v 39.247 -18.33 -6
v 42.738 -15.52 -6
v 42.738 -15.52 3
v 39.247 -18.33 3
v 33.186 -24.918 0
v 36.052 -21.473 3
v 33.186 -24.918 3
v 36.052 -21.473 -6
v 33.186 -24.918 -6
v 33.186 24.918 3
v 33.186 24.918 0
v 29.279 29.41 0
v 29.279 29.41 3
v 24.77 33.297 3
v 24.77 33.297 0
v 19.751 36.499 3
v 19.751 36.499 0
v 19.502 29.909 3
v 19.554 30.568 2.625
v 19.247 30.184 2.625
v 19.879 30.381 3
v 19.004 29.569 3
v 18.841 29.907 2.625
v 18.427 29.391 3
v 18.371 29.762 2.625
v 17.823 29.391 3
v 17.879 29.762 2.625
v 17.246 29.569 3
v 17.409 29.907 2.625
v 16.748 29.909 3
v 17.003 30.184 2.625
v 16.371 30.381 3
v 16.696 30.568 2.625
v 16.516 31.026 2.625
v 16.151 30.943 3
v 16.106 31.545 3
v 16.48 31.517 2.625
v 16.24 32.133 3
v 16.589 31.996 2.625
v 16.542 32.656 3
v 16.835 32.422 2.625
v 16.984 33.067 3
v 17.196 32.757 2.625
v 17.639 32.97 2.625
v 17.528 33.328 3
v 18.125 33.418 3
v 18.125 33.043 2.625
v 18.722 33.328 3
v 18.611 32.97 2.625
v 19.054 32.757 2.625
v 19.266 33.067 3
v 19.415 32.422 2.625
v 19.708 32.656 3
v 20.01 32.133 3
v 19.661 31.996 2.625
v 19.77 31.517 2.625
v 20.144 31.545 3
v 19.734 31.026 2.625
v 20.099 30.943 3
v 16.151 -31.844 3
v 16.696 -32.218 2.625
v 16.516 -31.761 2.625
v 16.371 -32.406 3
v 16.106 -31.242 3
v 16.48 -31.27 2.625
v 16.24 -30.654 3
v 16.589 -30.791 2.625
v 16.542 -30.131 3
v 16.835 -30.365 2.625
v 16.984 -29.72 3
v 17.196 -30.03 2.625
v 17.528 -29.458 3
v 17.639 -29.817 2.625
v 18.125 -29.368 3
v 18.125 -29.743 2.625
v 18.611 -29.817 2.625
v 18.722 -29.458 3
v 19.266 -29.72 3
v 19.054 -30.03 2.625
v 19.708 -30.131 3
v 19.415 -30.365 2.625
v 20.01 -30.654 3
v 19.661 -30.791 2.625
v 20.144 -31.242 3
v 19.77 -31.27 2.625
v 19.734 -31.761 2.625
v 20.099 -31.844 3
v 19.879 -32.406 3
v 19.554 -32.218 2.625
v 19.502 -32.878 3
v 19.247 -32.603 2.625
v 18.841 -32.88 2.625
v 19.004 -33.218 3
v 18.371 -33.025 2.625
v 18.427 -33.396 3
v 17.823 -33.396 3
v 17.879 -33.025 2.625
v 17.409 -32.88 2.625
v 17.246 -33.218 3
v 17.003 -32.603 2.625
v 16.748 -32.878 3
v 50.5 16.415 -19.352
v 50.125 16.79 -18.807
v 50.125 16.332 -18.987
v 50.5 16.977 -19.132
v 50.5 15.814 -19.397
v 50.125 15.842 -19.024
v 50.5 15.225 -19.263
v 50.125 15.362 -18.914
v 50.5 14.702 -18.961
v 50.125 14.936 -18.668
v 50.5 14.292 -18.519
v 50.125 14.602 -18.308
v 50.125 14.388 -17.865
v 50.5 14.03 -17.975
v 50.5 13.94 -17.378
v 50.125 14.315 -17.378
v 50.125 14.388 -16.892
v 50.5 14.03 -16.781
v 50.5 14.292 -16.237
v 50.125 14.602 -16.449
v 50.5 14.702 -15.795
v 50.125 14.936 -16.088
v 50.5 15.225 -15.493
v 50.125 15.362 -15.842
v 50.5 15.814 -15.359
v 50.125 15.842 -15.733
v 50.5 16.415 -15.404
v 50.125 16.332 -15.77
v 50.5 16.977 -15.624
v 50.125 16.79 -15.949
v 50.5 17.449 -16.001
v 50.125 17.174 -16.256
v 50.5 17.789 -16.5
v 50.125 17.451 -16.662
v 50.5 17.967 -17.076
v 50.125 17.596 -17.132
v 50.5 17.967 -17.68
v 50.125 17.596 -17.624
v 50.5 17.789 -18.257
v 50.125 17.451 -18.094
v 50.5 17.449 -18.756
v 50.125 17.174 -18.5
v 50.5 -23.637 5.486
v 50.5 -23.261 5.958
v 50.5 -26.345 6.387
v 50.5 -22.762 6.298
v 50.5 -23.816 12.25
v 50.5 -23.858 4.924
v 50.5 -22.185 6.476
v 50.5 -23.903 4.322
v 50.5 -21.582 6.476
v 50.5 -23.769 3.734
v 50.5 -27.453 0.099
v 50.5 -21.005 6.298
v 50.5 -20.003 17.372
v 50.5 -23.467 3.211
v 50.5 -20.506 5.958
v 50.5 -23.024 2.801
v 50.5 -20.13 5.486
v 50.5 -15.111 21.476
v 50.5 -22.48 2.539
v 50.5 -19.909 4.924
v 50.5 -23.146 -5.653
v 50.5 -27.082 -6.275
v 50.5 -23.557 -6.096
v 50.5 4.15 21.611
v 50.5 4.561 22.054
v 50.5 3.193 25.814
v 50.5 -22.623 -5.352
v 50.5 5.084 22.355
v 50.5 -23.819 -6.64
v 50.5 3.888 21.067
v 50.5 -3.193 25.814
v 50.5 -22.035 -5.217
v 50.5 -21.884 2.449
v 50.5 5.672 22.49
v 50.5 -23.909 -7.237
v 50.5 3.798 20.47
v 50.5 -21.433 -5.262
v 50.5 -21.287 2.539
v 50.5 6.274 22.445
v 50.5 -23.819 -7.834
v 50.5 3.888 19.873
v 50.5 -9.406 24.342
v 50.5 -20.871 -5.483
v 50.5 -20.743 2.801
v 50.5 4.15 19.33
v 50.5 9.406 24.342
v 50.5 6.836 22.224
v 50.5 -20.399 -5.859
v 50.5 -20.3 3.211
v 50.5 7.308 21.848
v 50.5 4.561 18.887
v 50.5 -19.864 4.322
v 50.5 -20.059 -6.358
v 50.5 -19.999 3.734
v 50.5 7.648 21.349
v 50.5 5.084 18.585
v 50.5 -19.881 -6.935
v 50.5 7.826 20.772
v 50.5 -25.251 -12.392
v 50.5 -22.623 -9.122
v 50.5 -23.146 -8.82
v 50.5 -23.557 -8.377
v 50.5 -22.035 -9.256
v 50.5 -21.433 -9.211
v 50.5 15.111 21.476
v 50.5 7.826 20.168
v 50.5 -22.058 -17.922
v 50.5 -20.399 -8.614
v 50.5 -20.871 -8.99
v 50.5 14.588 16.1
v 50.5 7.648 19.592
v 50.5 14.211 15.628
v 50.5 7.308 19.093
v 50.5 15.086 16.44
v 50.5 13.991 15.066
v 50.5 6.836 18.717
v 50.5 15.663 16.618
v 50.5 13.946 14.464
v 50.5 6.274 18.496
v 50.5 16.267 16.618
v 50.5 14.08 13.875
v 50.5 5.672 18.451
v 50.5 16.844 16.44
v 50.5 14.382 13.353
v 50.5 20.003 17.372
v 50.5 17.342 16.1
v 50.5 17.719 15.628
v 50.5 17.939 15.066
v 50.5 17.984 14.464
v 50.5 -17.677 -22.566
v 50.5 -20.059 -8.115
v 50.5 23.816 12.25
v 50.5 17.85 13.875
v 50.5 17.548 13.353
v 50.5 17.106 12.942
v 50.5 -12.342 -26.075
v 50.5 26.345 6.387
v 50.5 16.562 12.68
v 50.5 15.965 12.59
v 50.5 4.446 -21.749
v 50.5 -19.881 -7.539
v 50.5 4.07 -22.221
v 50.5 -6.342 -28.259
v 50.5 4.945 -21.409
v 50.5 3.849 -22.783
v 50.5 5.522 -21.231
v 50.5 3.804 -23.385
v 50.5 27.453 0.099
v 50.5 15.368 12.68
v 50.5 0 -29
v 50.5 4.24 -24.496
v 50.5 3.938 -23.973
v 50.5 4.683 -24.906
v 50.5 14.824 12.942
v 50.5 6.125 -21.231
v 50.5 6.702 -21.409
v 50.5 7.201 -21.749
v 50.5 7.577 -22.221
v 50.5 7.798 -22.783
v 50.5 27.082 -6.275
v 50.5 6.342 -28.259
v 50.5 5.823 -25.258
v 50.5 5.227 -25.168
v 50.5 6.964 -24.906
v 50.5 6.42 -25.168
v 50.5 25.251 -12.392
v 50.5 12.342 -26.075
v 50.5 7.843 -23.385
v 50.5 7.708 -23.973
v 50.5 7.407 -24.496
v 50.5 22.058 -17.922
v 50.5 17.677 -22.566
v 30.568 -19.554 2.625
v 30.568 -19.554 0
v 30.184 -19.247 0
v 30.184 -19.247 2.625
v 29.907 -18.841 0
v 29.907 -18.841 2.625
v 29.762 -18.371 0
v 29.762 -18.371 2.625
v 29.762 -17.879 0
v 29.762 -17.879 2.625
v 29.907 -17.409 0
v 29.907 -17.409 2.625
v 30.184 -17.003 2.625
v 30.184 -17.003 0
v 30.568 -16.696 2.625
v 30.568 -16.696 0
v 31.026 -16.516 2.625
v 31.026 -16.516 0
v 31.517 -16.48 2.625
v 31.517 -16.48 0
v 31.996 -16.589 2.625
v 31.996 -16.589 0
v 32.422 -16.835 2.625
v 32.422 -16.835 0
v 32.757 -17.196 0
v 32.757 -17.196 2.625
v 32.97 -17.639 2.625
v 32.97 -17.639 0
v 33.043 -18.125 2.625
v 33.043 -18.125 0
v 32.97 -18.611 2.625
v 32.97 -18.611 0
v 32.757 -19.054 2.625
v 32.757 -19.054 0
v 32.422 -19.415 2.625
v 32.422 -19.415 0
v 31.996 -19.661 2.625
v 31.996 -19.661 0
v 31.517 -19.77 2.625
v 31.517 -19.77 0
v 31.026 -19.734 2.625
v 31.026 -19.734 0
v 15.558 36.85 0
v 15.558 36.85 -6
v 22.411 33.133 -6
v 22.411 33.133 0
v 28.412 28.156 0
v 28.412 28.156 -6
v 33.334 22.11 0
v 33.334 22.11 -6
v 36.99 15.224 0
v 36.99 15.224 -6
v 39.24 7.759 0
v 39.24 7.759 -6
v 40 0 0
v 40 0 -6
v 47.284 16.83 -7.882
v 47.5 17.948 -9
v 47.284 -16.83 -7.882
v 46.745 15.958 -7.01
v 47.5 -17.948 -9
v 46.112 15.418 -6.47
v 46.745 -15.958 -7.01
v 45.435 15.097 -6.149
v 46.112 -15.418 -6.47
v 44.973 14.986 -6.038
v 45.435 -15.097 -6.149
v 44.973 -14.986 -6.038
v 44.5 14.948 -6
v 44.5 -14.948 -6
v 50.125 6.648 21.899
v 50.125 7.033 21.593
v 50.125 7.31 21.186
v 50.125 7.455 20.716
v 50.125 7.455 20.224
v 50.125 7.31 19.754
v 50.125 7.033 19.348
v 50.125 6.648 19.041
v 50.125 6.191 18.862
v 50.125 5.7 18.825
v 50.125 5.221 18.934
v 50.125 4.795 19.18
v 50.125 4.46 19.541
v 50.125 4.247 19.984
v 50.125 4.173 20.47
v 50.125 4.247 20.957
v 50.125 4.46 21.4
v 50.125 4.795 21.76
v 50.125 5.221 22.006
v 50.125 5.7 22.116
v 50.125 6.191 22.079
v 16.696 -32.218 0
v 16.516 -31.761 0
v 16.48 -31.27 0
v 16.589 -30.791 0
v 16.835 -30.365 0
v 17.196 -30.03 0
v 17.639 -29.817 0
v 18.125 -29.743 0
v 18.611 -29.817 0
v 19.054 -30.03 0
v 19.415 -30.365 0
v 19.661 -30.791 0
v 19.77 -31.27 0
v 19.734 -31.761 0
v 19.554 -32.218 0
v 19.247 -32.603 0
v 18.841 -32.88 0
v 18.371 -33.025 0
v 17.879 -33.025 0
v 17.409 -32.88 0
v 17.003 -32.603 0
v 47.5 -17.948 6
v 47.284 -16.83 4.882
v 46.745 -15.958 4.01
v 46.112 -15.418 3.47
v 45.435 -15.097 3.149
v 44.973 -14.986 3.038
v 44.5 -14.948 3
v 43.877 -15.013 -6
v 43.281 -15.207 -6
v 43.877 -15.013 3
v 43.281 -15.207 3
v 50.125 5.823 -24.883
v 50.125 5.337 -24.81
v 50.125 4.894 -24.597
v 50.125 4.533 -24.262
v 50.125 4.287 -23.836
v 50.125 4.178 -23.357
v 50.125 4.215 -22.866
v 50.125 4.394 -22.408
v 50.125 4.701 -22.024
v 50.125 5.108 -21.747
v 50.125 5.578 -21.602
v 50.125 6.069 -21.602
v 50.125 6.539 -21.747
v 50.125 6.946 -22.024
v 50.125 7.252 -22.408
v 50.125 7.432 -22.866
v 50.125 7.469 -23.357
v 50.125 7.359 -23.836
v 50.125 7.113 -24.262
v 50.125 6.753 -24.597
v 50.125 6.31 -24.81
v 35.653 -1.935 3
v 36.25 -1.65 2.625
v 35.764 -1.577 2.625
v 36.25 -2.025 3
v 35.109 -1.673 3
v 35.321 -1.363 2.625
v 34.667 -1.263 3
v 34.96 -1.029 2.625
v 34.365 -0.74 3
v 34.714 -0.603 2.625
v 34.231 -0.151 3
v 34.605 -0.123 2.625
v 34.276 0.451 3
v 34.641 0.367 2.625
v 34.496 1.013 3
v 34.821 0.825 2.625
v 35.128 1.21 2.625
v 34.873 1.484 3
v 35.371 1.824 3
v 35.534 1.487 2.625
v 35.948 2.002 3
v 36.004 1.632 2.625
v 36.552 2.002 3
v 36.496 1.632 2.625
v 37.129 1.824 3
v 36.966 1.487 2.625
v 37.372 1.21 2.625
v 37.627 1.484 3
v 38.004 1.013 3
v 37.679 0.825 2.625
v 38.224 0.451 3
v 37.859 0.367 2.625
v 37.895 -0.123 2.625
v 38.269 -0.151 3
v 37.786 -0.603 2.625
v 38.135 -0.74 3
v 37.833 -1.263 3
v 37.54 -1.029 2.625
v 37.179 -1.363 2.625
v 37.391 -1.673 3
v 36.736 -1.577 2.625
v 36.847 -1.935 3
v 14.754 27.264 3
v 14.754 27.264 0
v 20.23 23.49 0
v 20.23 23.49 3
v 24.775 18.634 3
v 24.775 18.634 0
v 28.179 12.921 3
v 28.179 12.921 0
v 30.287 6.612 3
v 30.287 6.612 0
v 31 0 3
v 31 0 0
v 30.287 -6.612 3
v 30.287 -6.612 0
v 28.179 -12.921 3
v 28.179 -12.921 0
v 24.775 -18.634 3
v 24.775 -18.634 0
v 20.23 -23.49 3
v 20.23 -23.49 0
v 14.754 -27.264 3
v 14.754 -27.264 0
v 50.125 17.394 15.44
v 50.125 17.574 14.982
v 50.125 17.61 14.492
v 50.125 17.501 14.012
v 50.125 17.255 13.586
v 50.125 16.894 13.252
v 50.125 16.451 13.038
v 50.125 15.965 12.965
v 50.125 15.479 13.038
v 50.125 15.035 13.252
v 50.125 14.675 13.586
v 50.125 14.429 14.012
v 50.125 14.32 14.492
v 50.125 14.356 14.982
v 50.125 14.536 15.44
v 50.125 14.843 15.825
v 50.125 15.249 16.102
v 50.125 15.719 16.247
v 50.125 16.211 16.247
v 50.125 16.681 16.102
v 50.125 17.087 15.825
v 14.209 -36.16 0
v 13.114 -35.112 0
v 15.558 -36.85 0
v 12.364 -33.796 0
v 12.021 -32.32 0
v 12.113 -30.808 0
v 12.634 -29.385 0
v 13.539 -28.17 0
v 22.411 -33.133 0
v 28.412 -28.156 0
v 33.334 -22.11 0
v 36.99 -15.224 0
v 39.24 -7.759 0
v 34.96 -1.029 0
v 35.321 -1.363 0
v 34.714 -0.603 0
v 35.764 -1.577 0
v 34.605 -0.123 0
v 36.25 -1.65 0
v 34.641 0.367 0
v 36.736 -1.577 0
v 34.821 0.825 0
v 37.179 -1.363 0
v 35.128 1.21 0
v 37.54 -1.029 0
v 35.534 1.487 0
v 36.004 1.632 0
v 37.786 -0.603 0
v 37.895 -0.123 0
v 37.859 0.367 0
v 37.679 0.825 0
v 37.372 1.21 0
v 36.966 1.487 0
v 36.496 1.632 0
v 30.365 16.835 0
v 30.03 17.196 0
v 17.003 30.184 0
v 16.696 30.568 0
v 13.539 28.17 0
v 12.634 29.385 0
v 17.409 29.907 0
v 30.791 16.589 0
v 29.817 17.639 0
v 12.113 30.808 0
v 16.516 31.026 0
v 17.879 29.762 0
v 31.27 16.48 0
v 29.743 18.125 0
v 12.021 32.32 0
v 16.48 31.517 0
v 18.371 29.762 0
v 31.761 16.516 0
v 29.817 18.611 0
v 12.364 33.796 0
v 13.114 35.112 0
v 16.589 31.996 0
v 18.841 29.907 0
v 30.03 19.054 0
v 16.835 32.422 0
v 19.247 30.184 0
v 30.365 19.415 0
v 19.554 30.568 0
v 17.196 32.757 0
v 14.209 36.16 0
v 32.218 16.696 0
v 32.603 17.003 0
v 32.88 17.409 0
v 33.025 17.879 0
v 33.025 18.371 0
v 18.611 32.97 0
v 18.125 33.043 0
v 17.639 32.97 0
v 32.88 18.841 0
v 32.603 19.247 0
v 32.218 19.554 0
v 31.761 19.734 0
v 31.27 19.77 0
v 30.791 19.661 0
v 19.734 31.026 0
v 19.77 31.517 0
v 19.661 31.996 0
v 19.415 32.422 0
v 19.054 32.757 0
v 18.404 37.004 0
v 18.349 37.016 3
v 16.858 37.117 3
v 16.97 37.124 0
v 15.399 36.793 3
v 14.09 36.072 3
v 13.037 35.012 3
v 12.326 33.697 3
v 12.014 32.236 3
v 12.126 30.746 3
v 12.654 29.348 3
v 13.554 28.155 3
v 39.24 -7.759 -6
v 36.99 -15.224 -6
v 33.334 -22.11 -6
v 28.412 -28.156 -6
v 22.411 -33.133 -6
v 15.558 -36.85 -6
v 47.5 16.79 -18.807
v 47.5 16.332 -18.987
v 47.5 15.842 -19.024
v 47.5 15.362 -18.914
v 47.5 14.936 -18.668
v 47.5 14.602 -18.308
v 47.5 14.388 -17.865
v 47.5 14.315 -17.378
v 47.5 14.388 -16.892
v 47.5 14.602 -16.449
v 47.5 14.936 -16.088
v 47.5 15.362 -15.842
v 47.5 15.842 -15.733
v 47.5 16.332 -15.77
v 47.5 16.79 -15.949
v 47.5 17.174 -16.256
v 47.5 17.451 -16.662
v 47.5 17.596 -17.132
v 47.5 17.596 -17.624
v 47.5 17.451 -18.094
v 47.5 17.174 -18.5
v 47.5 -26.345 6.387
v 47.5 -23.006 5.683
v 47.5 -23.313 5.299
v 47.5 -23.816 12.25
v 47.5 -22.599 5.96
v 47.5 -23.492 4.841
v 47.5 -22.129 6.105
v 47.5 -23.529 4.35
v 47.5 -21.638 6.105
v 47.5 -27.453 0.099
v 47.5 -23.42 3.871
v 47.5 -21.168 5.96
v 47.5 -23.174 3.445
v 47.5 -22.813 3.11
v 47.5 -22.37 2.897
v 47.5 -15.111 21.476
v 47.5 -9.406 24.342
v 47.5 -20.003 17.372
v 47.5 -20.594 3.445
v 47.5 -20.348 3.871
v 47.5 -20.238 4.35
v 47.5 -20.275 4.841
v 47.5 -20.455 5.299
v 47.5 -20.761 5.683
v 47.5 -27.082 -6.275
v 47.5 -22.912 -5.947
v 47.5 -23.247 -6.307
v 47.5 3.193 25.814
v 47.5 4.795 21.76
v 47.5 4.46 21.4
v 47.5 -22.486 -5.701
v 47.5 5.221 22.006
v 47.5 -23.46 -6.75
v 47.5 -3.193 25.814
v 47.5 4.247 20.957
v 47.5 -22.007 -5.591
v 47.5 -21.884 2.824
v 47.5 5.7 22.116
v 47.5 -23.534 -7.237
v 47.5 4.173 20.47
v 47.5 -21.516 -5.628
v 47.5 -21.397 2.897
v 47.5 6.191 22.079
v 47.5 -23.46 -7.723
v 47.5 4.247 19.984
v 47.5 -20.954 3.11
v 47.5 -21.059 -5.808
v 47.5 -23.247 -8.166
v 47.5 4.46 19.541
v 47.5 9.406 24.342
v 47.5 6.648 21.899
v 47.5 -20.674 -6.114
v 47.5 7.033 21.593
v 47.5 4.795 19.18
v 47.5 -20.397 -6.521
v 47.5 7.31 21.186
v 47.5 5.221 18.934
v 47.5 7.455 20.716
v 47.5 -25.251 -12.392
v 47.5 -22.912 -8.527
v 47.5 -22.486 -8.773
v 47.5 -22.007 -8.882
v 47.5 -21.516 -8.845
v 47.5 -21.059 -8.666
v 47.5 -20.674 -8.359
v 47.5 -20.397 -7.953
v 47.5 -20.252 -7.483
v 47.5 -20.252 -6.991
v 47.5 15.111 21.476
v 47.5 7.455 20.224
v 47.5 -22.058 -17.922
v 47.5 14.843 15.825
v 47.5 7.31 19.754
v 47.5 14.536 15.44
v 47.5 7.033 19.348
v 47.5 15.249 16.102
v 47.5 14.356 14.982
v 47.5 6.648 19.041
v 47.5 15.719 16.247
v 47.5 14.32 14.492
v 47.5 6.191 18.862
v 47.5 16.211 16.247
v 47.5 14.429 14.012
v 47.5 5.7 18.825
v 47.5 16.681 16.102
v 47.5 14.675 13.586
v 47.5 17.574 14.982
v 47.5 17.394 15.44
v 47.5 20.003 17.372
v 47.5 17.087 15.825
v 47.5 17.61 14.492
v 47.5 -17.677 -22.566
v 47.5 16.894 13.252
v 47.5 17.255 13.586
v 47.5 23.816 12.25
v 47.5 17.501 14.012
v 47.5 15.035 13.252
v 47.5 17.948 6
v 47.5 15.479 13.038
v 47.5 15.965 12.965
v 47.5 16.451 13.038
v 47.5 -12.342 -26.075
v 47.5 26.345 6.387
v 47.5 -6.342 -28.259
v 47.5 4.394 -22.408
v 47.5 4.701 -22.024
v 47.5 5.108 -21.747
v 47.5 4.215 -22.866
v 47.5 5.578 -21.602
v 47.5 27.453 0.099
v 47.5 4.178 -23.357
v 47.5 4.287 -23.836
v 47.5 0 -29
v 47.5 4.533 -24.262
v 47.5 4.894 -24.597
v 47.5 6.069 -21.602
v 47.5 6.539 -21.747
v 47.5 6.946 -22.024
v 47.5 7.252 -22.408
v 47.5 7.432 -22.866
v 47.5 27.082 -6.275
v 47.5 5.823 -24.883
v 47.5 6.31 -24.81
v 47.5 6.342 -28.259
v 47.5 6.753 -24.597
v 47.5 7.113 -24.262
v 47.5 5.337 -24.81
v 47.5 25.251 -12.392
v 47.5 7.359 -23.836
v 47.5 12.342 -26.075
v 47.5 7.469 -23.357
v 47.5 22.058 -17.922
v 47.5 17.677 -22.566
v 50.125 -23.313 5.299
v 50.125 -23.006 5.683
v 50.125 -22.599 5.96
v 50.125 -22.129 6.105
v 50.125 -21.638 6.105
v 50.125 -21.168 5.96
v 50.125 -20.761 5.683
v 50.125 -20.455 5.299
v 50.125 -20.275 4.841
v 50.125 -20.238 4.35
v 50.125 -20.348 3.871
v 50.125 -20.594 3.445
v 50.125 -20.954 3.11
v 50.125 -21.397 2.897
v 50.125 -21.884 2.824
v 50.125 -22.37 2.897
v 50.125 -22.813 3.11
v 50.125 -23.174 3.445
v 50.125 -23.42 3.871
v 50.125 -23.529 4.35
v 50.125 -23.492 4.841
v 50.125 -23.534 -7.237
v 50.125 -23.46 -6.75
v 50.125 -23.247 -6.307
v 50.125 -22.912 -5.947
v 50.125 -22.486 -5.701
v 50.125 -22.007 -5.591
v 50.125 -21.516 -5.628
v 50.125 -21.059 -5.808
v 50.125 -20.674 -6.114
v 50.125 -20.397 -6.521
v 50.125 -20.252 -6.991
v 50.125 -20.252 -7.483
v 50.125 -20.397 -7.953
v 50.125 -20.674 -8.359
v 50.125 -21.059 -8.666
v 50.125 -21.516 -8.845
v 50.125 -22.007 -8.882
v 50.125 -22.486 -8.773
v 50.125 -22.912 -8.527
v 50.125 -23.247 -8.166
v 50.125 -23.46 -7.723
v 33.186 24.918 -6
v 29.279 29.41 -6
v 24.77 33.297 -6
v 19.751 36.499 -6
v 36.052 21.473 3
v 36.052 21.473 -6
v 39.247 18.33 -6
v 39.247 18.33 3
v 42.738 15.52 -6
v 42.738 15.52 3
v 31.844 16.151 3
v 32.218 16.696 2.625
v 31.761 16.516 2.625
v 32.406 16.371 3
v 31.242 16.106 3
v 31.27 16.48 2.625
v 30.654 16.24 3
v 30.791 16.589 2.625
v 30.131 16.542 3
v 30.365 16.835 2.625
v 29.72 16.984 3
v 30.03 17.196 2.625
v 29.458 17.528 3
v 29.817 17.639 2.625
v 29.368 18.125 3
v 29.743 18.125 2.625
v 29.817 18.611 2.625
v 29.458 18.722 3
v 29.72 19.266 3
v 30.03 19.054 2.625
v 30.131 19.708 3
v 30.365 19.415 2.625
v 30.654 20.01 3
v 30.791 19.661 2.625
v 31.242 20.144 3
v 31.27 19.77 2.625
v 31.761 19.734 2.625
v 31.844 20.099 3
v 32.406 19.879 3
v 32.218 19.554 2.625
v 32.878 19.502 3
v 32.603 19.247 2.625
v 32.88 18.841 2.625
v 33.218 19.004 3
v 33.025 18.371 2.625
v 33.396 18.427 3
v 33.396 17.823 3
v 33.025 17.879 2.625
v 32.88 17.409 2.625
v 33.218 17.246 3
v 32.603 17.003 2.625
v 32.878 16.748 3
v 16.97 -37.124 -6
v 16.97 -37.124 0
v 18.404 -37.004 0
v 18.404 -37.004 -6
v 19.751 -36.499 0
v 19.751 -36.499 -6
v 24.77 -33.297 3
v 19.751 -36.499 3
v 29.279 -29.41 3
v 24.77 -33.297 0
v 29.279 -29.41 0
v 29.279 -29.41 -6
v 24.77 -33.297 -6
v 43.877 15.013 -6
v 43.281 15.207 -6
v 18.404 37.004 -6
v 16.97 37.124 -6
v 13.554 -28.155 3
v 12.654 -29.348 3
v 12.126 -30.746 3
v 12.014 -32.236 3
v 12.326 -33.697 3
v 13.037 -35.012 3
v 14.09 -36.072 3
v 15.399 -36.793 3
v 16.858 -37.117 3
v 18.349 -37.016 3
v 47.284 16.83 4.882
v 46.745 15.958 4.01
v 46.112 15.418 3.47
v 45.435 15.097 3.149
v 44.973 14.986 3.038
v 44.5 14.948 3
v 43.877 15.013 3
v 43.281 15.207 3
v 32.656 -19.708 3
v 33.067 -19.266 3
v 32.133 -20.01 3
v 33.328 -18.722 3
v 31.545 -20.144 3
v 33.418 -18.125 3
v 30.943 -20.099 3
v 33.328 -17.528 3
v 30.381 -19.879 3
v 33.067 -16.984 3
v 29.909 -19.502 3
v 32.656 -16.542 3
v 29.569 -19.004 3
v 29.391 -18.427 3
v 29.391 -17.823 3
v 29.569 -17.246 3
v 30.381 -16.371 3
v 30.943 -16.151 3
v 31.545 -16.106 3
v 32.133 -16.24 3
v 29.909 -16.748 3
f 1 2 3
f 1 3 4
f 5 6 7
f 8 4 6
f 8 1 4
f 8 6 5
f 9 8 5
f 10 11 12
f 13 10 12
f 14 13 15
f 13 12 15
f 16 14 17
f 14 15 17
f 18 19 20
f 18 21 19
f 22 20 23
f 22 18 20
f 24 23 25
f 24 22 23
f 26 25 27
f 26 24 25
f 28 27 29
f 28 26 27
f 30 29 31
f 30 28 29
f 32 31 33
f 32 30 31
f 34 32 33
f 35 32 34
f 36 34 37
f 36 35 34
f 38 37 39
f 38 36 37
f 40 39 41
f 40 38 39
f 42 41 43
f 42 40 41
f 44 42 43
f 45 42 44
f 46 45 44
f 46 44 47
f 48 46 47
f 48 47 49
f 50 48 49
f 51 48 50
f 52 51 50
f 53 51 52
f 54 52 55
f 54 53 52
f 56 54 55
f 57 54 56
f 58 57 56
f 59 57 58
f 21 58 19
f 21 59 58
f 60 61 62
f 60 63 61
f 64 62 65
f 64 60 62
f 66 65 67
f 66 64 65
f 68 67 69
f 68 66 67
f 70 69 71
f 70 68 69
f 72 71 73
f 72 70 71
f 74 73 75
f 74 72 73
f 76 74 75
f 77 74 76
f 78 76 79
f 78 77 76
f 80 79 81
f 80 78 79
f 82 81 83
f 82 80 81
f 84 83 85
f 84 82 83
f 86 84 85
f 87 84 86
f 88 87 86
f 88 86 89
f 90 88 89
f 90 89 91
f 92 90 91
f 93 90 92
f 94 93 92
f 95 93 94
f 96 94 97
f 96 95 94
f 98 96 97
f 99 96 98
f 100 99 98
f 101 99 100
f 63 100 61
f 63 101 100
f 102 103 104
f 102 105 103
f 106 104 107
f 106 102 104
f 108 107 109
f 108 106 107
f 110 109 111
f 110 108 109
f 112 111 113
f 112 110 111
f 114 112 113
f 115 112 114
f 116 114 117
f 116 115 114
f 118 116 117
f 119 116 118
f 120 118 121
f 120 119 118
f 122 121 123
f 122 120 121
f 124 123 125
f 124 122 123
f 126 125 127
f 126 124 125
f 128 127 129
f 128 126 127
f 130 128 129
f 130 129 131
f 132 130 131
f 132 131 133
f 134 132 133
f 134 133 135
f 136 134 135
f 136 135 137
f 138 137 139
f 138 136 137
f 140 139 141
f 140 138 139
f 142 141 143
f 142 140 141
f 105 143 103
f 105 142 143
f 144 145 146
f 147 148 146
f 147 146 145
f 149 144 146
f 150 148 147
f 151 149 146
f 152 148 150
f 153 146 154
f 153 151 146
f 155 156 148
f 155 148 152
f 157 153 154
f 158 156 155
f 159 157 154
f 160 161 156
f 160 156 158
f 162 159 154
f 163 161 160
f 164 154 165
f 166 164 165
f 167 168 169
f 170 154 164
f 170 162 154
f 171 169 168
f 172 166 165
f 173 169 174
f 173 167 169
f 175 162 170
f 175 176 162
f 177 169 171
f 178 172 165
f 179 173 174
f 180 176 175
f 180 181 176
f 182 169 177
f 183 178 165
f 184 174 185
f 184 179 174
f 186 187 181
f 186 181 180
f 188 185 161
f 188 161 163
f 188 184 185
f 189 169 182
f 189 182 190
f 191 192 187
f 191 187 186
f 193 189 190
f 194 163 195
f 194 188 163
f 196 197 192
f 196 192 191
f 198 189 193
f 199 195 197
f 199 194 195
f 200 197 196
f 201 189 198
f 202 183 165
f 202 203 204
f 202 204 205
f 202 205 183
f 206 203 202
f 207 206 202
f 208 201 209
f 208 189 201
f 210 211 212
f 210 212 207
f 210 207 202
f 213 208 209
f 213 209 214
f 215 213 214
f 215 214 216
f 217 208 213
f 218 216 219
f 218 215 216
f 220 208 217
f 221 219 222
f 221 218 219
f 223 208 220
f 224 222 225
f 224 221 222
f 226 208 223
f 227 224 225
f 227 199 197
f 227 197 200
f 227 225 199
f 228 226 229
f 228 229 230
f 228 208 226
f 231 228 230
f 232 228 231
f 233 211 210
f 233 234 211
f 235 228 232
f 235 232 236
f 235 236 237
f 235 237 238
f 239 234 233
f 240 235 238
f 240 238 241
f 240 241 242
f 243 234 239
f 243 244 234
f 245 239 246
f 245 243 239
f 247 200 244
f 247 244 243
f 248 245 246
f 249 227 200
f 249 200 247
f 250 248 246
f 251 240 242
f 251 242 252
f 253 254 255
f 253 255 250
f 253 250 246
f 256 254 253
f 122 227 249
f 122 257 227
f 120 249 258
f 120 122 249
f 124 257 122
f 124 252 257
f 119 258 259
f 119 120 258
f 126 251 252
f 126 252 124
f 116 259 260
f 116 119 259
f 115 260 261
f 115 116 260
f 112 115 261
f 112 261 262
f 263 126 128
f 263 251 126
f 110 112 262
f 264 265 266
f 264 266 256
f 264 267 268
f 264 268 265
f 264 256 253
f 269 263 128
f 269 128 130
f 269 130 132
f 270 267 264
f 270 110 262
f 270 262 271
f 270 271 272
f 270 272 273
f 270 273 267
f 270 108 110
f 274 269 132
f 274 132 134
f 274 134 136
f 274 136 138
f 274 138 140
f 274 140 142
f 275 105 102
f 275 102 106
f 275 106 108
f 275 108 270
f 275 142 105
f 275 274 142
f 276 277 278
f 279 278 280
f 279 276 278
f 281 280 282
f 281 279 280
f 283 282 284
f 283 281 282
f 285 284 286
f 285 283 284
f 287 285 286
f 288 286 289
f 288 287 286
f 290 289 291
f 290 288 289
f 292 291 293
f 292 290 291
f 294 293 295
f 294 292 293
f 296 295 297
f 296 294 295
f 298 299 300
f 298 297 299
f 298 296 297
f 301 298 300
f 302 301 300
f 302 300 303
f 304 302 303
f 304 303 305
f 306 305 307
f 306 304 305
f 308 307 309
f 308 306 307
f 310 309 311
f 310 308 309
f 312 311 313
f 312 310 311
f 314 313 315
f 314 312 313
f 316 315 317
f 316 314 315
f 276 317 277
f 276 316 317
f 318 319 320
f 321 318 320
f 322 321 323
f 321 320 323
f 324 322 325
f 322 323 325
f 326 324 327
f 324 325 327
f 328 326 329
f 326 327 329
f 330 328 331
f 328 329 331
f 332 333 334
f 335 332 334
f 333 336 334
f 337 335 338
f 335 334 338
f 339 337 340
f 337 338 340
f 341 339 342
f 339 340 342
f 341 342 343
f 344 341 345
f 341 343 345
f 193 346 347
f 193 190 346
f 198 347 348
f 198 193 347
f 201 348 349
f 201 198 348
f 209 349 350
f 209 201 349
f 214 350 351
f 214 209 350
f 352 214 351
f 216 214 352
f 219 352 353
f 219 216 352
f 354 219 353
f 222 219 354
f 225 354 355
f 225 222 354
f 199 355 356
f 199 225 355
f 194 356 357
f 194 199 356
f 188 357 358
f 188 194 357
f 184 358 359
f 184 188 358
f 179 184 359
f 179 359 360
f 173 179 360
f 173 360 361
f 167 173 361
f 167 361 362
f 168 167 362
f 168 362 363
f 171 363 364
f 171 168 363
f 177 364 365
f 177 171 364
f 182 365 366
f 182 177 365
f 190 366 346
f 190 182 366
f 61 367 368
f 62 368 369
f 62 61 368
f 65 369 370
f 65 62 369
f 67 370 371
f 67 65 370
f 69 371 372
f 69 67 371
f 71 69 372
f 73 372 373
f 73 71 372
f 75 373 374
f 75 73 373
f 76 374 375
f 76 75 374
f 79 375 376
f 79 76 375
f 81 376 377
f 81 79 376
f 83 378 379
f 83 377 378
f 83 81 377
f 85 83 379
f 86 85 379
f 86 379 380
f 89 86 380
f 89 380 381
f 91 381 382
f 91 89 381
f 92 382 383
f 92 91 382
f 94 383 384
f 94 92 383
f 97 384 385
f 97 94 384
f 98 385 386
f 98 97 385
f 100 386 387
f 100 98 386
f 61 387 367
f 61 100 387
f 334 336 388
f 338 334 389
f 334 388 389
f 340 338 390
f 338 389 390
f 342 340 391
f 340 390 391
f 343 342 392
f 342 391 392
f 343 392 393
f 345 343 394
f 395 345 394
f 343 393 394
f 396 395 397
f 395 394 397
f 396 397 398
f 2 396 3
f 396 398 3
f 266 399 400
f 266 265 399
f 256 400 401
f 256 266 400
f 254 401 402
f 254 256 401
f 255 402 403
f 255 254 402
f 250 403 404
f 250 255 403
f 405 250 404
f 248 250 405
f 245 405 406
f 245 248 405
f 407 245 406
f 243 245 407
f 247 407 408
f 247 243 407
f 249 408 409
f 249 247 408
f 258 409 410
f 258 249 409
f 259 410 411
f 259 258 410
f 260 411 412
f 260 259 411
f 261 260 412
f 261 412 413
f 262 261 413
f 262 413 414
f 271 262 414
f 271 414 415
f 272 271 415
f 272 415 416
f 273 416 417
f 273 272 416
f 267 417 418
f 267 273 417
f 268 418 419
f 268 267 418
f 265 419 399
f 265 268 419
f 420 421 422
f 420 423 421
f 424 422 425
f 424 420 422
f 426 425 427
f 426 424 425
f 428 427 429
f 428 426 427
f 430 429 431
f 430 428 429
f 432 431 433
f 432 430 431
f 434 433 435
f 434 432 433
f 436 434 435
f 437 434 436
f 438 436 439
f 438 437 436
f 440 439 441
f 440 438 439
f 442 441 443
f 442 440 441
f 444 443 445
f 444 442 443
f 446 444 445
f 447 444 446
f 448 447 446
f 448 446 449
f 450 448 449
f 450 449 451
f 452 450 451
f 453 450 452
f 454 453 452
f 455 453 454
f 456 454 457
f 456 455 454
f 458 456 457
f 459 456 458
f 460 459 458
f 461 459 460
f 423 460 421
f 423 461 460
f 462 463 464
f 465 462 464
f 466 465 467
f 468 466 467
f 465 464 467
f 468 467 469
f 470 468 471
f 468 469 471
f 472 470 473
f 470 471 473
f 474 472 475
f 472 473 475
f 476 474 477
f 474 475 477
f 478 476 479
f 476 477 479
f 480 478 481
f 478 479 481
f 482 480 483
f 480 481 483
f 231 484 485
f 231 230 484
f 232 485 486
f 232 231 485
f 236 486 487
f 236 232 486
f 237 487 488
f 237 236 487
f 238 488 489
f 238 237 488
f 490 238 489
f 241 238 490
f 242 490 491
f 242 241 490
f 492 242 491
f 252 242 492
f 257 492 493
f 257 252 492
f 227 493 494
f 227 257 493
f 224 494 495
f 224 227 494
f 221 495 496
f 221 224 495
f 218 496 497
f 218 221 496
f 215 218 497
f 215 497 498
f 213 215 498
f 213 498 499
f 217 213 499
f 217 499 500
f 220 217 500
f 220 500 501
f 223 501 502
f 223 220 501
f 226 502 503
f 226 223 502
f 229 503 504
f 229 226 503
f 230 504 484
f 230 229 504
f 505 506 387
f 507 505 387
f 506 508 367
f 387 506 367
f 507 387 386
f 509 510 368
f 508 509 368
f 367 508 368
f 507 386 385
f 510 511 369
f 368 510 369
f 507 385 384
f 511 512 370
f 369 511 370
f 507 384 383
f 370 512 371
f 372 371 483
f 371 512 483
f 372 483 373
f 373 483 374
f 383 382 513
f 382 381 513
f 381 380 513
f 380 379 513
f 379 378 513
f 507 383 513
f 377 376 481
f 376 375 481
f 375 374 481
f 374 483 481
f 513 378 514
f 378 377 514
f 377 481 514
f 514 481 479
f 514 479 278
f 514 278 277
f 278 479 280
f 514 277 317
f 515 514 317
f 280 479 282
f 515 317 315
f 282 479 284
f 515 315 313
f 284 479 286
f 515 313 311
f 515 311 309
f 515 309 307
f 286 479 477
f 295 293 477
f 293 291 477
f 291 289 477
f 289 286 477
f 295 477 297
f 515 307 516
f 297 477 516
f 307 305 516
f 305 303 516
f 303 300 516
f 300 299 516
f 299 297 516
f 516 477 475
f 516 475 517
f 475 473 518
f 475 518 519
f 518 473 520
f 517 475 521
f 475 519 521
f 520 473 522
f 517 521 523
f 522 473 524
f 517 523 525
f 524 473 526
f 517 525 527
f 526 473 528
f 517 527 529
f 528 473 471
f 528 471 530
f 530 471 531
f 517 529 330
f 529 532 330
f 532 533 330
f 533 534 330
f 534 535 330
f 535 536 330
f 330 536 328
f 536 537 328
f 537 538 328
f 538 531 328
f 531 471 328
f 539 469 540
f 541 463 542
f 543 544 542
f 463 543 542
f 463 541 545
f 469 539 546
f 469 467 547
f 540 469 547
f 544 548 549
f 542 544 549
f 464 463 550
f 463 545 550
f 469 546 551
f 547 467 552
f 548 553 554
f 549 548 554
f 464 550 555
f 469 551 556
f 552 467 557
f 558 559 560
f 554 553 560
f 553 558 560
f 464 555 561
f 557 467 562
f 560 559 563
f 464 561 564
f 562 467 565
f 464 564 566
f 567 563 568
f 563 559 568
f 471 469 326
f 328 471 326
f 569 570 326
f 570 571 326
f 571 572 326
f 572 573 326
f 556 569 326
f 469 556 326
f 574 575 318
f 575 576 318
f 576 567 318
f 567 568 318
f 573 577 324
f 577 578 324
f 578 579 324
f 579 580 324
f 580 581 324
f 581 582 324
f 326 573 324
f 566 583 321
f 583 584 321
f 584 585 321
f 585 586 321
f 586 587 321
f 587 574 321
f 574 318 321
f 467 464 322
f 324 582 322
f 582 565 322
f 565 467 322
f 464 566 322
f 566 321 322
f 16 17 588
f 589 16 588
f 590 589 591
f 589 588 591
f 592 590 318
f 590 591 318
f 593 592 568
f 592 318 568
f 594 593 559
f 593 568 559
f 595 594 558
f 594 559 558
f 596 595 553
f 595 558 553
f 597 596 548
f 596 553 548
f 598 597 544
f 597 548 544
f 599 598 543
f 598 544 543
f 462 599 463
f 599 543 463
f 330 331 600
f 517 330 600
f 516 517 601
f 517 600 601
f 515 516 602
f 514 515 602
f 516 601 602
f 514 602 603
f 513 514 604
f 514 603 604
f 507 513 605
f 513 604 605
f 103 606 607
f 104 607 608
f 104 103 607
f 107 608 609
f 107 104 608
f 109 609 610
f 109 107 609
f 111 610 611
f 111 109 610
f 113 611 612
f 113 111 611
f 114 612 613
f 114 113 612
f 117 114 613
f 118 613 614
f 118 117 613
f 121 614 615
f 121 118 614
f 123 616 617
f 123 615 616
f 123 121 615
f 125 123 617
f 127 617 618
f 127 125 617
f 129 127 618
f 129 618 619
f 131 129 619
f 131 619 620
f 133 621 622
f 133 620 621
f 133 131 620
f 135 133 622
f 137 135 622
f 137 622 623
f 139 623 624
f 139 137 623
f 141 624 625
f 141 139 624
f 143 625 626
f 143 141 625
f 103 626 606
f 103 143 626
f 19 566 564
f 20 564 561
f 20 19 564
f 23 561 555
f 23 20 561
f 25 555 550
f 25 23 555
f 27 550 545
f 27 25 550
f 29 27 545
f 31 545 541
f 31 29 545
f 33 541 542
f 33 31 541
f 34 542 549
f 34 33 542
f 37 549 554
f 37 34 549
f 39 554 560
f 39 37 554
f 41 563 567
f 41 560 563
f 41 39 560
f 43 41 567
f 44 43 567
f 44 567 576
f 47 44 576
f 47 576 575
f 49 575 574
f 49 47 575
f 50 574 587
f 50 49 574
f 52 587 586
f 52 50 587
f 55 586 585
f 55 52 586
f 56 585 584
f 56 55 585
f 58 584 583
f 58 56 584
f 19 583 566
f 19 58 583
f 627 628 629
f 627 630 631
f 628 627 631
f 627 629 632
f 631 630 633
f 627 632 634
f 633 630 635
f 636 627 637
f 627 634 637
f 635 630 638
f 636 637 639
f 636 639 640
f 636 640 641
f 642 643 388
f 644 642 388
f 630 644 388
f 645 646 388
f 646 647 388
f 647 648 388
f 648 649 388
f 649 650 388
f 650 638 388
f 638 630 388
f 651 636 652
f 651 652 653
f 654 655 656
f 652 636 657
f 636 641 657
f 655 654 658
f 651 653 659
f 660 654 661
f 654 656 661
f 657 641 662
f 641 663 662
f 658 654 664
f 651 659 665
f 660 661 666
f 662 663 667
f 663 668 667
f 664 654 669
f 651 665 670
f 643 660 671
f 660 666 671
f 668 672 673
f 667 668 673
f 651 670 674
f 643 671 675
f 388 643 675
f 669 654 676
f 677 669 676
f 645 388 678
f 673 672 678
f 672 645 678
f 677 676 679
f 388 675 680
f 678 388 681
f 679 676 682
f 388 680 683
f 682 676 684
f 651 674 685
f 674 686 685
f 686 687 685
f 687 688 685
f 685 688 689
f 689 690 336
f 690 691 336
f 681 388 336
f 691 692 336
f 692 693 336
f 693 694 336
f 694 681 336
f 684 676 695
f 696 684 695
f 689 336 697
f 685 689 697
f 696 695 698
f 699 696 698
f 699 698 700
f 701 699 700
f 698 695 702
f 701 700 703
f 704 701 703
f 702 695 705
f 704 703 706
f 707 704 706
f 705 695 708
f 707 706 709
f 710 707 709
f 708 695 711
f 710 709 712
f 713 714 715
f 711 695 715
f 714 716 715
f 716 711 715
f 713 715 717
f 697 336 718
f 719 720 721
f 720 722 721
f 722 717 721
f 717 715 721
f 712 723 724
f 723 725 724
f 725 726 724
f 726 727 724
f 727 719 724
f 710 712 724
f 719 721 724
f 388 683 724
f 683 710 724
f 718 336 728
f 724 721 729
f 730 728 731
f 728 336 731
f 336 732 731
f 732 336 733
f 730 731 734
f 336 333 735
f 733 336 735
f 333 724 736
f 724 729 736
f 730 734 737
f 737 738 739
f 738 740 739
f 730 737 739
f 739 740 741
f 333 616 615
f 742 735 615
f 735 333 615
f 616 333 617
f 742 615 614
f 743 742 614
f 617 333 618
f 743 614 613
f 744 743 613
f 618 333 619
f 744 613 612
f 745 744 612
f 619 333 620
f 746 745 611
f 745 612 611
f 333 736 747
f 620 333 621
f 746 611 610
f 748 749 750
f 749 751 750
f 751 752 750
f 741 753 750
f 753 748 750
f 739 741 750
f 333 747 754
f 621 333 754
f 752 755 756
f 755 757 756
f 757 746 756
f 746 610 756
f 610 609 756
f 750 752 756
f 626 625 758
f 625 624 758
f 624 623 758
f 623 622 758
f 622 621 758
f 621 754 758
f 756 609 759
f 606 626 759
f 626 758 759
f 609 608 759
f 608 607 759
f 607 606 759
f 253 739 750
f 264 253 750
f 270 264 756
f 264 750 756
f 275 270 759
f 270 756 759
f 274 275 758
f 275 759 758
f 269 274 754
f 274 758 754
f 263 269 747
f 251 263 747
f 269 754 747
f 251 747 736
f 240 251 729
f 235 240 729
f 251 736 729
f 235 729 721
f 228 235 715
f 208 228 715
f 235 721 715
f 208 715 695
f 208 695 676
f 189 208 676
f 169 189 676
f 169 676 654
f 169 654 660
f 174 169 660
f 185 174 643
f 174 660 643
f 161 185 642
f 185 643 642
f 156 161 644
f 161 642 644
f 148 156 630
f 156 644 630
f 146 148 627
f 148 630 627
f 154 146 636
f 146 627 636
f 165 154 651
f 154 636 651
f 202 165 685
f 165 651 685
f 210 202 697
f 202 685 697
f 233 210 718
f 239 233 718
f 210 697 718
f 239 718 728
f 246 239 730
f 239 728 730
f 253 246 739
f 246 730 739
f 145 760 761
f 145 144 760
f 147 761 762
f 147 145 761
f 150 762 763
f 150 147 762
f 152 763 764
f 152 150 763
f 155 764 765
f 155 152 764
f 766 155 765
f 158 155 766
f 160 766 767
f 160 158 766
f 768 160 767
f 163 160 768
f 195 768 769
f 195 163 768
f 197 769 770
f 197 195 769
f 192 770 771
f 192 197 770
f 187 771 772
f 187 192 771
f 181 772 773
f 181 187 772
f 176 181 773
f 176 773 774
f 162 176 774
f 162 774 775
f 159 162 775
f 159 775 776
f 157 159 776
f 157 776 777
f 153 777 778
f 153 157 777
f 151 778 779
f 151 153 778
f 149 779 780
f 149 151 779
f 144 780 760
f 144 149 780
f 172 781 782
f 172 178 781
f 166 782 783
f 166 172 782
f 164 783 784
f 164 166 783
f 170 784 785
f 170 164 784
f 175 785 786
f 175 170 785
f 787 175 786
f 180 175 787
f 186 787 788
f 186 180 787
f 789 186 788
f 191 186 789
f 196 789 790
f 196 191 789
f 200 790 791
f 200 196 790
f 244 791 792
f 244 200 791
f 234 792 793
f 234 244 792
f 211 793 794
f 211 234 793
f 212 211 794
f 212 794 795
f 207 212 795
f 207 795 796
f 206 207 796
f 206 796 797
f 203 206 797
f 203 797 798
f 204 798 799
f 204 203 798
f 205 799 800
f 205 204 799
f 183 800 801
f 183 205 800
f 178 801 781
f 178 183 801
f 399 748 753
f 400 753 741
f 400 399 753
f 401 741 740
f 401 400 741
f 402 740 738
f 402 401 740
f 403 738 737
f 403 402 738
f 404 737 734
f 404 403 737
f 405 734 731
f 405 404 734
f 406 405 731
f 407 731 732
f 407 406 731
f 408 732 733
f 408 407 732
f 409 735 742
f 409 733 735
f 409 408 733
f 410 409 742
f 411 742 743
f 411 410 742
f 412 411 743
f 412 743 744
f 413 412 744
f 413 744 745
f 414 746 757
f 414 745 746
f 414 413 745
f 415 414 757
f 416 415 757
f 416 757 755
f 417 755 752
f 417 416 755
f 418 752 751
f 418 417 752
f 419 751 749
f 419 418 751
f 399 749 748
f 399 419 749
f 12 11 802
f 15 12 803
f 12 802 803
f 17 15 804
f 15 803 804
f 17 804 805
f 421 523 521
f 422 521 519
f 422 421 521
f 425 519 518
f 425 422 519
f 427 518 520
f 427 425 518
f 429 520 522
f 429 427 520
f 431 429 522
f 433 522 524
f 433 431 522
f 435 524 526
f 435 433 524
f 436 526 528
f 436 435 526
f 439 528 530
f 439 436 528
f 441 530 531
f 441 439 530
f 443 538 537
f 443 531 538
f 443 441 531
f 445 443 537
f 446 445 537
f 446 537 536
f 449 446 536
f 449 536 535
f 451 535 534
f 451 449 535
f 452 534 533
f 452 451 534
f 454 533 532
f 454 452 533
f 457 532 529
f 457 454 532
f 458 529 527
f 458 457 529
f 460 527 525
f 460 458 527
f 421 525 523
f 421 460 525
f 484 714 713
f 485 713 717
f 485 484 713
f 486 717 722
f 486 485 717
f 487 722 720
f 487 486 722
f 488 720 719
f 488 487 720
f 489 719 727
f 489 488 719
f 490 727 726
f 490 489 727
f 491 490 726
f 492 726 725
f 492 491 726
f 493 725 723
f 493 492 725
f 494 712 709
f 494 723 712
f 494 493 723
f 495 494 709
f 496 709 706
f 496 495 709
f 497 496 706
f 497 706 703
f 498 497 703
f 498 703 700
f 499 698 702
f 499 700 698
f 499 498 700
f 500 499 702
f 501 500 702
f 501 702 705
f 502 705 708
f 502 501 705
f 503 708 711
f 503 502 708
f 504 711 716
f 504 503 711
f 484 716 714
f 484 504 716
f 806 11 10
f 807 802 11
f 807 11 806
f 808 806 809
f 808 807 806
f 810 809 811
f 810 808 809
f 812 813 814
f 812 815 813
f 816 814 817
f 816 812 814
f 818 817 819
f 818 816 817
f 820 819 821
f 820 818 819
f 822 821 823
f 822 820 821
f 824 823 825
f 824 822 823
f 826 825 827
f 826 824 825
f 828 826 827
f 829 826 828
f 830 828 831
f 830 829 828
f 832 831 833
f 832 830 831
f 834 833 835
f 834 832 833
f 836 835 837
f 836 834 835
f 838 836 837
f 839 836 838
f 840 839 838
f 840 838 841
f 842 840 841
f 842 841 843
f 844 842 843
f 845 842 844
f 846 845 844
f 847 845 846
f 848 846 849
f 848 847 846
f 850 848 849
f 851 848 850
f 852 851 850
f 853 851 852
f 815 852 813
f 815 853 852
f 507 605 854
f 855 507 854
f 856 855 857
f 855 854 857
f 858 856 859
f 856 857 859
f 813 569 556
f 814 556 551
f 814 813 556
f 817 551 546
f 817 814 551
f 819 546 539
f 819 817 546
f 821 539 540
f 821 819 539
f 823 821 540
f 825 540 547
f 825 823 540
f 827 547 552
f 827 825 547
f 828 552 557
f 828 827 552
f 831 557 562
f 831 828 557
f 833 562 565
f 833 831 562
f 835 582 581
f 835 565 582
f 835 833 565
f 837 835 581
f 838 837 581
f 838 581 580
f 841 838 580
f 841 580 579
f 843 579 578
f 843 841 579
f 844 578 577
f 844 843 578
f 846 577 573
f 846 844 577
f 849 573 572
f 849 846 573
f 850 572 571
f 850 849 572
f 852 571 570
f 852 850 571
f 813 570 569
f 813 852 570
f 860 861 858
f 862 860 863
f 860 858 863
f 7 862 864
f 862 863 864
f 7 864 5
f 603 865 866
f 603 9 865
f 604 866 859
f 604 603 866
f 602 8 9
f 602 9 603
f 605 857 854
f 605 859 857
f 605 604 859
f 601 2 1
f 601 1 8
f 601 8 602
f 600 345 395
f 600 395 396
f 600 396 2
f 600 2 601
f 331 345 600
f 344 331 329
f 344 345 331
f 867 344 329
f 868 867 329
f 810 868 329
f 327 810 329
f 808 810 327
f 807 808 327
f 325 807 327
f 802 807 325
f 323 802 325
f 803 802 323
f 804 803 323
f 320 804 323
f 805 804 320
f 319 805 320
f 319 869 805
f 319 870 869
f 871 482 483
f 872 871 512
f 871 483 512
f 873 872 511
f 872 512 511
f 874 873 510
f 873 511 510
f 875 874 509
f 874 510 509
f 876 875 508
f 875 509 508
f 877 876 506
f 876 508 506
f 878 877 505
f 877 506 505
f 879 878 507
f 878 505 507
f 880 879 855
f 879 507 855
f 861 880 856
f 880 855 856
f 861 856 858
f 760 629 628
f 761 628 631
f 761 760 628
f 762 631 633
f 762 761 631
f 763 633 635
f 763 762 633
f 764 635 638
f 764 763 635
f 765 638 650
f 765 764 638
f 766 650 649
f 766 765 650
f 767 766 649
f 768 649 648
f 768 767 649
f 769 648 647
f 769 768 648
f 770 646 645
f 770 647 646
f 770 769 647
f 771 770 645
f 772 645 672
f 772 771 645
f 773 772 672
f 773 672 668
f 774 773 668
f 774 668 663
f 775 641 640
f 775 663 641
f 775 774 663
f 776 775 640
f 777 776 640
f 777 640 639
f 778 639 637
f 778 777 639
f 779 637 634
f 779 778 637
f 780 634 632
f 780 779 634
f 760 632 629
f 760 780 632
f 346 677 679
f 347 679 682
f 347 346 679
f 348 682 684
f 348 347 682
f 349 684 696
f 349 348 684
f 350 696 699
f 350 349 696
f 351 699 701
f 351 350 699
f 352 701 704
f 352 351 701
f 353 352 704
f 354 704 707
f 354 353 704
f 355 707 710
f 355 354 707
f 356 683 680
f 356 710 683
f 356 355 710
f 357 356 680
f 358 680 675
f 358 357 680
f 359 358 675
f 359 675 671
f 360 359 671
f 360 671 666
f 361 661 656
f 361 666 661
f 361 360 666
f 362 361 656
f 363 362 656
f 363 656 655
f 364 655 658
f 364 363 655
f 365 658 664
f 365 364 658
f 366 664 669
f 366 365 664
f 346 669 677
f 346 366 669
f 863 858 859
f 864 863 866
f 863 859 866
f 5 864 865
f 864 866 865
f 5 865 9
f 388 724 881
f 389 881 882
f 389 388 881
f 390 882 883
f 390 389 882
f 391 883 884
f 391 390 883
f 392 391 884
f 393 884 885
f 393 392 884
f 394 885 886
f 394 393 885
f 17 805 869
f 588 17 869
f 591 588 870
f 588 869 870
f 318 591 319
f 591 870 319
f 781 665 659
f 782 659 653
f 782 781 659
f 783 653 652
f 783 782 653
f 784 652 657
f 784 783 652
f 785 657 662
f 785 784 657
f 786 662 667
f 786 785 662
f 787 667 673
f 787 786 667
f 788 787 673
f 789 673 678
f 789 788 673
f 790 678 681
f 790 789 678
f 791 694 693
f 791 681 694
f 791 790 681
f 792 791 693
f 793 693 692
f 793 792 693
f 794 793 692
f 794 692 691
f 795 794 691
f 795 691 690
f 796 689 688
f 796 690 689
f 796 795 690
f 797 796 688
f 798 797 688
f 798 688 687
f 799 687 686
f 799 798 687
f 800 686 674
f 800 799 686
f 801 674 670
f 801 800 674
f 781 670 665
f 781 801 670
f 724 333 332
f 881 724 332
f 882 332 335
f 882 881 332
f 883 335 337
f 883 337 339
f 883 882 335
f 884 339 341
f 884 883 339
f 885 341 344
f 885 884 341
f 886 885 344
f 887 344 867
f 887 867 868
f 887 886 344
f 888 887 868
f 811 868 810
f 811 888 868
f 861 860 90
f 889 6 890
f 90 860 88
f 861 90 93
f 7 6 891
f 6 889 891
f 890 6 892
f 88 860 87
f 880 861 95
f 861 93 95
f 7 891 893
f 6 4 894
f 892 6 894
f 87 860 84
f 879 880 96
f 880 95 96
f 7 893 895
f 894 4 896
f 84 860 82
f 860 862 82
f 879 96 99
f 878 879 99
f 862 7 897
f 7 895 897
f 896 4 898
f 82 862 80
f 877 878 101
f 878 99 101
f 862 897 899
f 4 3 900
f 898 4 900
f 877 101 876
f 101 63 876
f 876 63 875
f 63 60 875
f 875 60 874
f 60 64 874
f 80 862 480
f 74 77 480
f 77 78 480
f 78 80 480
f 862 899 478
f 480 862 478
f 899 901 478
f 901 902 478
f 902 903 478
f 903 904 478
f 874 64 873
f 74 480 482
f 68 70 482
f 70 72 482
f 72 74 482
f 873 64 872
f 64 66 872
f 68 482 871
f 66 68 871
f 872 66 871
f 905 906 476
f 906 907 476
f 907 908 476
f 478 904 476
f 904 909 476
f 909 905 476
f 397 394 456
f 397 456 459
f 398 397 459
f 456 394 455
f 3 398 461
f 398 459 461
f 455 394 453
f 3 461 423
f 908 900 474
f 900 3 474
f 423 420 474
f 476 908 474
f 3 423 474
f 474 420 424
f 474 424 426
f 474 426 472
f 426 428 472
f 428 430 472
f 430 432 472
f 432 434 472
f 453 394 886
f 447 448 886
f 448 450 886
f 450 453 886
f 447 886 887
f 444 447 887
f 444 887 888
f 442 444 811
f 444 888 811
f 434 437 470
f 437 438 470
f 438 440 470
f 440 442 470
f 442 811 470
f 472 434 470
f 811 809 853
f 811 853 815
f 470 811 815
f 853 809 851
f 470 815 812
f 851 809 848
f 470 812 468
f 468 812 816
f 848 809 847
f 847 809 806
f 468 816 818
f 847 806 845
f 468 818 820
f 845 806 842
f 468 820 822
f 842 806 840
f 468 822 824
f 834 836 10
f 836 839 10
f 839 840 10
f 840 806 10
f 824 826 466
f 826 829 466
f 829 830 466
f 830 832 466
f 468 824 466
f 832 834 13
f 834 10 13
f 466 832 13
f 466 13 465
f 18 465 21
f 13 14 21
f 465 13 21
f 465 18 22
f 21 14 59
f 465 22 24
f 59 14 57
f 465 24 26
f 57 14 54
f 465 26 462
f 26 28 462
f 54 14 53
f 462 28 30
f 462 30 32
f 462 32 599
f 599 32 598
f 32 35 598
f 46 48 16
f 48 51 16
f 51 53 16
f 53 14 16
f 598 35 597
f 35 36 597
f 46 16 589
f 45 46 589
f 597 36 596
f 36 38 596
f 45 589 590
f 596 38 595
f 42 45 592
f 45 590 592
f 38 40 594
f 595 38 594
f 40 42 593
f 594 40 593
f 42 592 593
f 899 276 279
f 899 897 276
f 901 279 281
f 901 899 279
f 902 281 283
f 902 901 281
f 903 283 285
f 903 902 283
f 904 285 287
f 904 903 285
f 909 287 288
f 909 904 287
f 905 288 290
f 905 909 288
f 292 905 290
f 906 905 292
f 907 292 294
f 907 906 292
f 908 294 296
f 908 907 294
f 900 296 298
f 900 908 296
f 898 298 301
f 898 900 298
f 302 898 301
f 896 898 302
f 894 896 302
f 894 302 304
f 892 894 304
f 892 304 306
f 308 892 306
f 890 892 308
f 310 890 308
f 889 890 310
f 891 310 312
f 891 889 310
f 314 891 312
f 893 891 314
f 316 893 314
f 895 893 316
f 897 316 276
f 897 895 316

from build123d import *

# Parameters (mm, degrees)
BOSS_EXTRUDE5_DEPTH = 3
BOSS_EXTRUDE6_START = -6
BOSS_EXTRUDE6_DEPTH = 6
CIRPATTERN4_COUNT   = 12
BOSS_EXTRUDE8_START = -9
BOSS_EXTRUDE8_DEPTH = 9
SKETCH25_R          = 27.5
SKETCH25_W          = 9
SKETCH25_H          = 25
BOSS_EXTRUDE9_DEPTH = 3
CIRPATTERN5_COUNT   = 12
FILLET2_R           = 3


with BuildPart() as part:
    # Sketch1 → Boss-Extrude5 (new body)
    with BuildSketch(Plane.XY):
        with BuildLine():
            ThreePointArc((14.753571677, -27.264117862), (12.634850146, -34.380016896), (19.750749181, -36.498738428))
            ThreePointArc((19.750749181, -36.498738428), (41.5, 0), (19.750749181, 36.498738428))
            ThreePointArc((19.750749181, 36.498738428), (12.634850146, 34.380016896), (14.753571677, 27.264117862))
            ThreePointArc((14.753571677, 27.264117862), (31, 0), (14.753571677, -27.264117862))
        make_face()
    extrude(amount=BOSS_EXTRUDE5_DEPTH)

    # Sketch1<7> → Boss-Extrude6 (add)
    with BuildSketch(Plane.XY.offset(BOSS_EXTRUDE6_START)):
        with BuildLine():
            ThreePointArc((40, 0), (33.333983987, -22.109851007), (15.557724422, -36.850470972))
            ThreePointArc((15.557724422, -36.850470972), (17.691016162, -37.113053671), (19.750749181, -36.498738428))
            ThreePointArc((19.750749181, -36.498738428), (35.650428406, -21.243750952), (41.5, 0))
            ThreePointArc((41.5, 0), (35.650428406, 21.243750952), (19.750749181, 36.498738428))
            ThreePointArc((19.750749181, 36.498738428), (17.691016162, 37.113053671), (15.557724422, 36.850470972))
            ThreePointArc((15.557724422, 36.850470972), (33.333983987, 22.109851007), (40, 0))
        make_face()
    extrude(amount=BOSS_EXTRUDE6_DEPTH)

    # Sketch23 → M4x0.7 Tapped Hole4 (revolve, cut)
    with BuildSketch(Plane(origin=(36.25, 0, 3), x_dir=(0, -1, 0), z_dir=(1, 0, 0))):
        Polygon((0, 0), (0, 11.091420021), (1.65, 10.1), (1.65, 0.375), (2.025, 0), align=None)
    m4x0_7_tapped_hole4 = revolve(axis=Axis((36.25, 0, 9.35), (0, 0, -1)), mode=Mode.SUBTRACT)

    # CirPattern4: M4x0.7 Tapped Hole4 ×12 about axis, 7 skipped
    cirpattern4_axis = Axis((0, 0, 0), (0, 0, -1))
    add([m4x0_7_tapped_hole4.rotate(cirpattern4_axis, i * 360 / CIRPATTERN4_COUNT) for i in range(1, CIRPATTERN4_COUNT) if i not in (3, 4, 5, 6, 7, 8, 9)], mode=Mode.SUBTRACT)

    # Sketch15 → Boss-Extrude8 (add)
    with BuildSketch(Plane.XY.offset(3).offset(BOSS_EXTRUDE8_START)):
        with BuildLine():
            Line((47.5, 12.5), (47.5, -12.5))
            ThreePointArc((47.5, -12.5), (39.682119593, -17.947088957), (33.186389126, -24.918137506))
            ThreePointArc((33.186389126, -24.918137506), (41.5, 0), (33.186389126, 24.918137506))
            ThreePointArc((33.186389126, 24.918137506), (39.682119593, 17.947088957), (47.5, 12.5))
        make_face()
    extrude(amount=BOSS_EXTRUDE8_DEPTH)

    # Sketch25 → Boss-Extrude9 (add)
    # profile 1 of 2: a face of its own
    with BuildSketch(Plane(origin=(47.5, 0, 0), x_dir=(0, 0, -1), z_dir=(1, 0, 0))):
        with Locations((1.5, 0)):
            Circle(SKETCH25_R)
        with Locations((1.5, 0)):
            Rectangle(SKETCH25_W, SKETCH25_H, mode=Mode.SUBTRACT)
    # profile 2 of 2: a face of its own
    with BuildSketch(Plane(origin=(47.5, 0, 0), x_dir=(0, 0, -1), z_dir=(1, 0, 0))):
        with Locations((1.5, 0)):
            Rectangle(SKETCH25_W, SKETCH25_H)
    extrude(amount=BOSS_EXTRUDE9_DEPTH)

    # Sketch28 → M4x0.7 Tapped Hole5 (revolve, cut)
    with BuildSketch(Plane(origin=(50.5, 5.823428515, -23.233331092), x_dir=(0, 0, -1), z_dir=(0, 1, 0))):
        Polygon((0, 0), (0, 11.091420021), (1.65, 10.1), (1.65, 0.375), (2.025, 0), align=None)
    m4x0_7_tapped_hole5 = revolve(axis=Axis((56.85, 5.823428515, -23.233331092), (-1, 0, 0)), mode=Mode.SUBTRACT)

    # CirPattern5: M4x0.7 Tapped Hole5 ×12 about axis, 6 skipped
    cirpattern5_axis = Axis((0, -0.031748609, -1.381512577), (1, 0, 0))
    add([m4x0_7_tapped_hole5.rotate(cirpattern5_axis, i * 360 / CIRPATTERN5_COUNT) for i in range(1, CIRPATTERN5_COUNT) if i not in (2, 3, 6, 7, 10, 11)], mode=Mode.SUBTRACT)

    # Fillet2
    fillet2_edges = [part.edges().sort_by_distance(p)[0] for p in [
        (47.5, 0, -6),
        (47.5, 12.5, -1.5),
        (47.5, -12.5, -1.5),
        (47.5, 0, 3),
    ]]
    fillet(fillet2_edges, radius=FILLET2_R)


solid = part.part
